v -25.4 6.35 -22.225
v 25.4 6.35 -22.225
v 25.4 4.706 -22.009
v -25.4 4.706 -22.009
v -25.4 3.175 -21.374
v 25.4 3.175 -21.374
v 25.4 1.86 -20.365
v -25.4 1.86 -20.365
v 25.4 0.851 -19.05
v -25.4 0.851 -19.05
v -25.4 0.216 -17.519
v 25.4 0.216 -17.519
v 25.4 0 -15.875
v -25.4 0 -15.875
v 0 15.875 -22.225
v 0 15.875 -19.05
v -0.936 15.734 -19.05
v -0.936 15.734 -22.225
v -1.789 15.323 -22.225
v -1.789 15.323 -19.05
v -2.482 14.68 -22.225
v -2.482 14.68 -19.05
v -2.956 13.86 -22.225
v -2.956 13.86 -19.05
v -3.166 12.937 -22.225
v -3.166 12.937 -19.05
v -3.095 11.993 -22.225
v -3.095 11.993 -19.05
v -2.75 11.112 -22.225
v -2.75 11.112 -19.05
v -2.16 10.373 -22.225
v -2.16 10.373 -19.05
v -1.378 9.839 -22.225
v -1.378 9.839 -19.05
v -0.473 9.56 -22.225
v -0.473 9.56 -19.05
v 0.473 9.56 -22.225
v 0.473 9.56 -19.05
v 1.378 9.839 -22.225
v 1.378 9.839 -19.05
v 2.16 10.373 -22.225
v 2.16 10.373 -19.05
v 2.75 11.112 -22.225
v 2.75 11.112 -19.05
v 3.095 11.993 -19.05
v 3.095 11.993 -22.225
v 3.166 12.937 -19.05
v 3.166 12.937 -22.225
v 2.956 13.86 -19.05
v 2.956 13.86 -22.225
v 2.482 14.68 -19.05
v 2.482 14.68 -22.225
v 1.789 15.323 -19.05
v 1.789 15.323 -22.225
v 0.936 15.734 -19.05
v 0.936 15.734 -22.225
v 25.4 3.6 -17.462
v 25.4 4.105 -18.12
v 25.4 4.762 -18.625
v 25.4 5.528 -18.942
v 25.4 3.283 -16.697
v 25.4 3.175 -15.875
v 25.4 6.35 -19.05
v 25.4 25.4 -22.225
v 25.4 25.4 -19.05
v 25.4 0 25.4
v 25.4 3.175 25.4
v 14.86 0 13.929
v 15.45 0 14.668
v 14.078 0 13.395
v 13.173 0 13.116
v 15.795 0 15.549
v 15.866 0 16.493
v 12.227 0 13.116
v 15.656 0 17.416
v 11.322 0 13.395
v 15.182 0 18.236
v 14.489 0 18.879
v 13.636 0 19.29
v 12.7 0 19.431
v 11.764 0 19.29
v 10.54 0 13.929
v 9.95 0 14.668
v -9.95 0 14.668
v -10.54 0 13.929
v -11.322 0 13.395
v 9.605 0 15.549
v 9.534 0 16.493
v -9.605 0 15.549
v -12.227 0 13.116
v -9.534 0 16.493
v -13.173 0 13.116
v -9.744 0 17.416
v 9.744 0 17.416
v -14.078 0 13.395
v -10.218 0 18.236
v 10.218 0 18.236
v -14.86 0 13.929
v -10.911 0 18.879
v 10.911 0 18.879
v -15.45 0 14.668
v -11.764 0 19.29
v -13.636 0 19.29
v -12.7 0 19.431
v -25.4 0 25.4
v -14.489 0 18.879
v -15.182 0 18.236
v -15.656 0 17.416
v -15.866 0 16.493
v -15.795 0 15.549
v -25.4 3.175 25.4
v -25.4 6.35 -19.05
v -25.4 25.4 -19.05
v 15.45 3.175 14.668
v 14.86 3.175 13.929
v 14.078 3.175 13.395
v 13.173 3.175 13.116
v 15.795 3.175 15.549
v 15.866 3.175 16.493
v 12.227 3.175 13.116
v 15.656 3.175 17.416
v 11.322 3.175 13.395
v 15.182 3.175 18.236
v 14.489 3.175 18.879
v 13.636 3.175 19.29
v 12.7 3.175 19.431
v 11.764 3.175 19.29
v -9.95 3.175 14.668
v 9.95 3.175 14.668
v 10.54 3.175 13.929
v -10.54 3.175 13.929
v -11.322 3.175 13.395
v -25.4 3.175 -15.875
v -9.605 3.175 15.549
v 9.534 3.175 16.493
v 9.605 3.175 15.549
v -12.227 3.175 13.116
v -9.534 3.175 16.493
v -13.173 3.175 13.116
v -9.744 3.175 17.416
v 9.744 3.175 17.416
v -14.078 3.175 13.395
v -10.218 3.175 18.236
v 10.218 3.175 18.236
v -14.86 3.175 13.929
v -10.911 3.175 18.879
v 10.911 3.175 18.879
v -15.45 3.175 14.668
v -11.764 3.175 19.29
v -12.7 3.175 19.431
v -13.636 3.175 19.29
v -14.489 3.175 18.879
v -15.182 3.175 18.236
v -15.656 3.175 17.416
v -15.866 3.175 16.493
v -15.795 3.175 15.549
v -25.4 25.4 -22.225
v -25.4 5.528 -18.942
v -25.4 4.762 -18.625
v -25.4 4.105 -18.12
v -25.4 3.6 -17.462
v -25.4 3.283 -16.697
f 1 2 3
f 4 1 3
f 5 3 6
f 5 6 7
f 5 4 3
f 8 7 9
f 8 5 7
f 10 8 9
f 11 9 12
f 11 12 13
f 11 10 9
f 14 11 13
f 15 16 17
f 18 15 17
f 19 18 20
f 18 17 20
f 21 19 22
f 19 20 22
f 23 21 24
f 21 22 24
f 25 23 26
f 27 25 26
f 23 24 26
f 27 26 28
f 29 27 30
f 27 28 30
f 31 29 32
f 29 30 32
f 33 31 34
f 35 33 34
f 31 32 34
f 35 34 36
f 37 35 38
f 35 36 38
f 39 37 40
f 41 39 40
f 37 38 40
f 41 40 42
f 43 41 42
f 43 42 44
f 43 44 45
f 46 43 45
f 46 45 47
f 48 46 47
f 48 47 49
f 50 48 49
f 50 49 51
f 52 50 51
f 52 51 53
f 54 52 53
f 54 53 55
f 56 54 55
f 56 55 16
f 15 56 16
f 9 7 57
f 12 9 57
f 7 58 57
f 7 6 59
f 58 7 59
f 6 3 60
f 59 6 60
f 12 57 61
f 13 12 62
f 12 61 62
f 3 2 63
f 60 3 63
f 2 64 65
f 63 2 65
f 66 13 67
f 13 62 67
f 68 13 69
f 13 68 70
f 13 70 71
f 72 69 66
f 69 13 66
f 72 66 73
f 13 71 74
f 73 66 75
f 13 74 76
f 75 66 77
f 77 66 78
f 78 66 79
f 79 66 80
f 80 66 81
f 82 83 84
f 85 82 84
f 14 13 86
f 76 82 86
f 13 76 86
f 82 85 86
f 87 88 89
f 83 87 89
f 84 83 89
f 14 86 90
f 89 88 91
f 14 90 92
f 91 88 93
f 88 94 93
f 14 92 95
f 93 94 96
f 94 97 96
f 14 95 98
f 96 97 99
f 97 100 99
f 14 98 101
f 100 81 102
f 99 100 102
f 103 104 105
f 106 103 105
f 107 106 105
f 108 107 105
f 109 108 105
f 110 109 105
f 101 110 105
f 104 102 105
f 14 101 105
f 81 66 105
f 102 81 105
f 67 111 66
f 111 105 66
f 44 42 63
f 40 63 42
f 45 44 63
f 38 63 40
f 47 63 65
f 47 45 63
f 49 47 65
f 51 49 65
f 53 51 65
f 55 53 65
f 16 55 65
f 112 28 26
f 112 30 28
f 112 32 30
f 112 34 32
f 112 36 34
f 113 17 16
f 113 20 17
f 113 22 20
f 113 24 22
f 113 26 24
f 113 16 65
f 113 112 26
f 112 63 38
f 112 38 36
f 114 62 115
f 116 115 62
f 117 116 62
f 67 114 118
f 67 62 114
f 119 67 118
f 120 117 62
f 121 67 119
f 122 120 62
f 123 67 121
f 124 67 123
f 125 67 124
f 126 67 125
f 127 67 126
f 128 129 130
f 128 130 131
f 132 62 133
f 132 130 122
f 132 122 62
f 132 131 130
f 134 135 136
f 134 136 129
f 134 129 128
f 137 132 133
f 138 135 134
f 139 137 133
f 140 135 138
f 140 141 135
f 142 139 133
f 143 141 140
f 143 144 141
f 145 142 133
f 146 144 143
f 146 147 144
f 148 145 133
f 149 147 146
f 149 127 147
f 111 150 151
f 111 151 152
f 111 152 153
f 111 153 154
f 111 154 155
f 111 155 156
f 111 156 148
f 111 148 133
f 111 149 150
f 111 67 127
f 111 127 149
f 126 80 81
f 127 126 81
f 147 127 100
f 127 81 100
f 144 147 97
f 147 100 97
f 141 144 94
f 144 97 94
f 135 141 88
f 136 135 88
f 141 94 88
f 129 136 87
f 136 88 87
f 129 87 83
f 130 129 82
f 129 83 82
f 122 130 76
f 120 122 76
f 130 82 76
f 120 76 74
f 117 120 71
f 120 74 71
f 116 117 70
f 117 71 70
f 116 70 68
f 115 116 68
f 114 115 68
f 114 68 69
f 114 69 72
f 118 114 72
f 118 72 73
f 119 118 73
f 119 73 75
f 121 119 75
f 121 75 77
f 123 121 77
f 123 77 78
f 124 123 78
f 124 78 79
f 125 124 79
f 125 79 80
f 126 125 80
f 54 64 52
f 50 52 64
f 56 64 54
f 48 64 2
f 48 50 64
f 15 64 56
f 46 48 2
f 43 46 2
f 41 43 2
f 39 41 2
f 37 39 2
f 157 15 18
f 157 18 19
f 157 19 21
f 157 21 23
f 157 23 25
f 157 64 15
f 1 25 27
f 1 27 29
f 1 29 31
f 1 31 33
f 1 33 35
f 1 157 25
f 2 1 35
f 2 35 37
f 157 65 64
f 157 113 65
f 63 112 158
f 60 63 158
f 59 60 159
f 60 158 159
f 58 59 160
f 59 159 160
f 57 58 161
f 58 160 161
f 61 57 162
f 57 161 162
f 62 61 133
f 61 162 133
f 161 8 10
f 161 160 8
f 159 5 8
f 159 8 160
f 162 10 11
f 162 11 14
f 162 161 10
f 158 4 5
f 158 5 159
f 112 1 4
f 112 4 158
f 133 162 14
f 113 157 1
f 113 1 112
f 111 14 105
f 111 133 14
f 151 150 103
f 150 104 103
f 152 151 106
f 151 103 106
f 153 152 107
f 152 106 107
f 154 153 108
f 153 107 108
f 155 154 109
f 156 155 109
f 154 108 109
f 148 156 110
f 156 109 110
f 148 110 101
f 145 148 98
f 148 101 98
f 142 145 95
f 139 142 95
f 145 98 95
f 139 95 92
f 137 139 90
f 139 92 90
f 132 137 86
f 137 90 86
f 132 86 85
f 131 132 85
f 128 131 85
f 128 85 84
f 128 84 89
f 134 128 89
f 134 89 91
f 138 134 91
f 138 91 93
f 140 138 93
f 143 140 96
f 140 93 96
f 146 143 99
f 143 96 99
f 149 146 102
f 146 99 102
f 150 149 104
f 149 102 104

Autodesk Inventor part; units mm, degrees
ref_plane "YZ Plane" through (0, 0, 0) normal (1, 0, 0) x (0, 1, 0)
ref_plane "XZ Plane" through (0, 0, 0) normal (0, 1, 0) x (-1, 0, 0)
ref_plane "XY Plane" through (0, 0, 0) normal (0, 0, 1) x (1, 0, 0)
sketch "Sketch1" plane through (0, 0, 0) normal (0, 1, 0) x (-1, 0, 0)
  line L0 (25.4, 25.4) -> (-25.4, 25.4)
  line L1 (-25.4, 25.4) -> (-25.4, -22.225)
  line L2 (-25.4, -22.225) -> (25.4, -22.225)
  line L3 (25.4, -22.225) -> (25.4, 25.4)
  point P0 (0, 0)
  dimension "d0" = 50.8
  dimension "d1" = 47.625
  dimension "d2" = 25.4
  dimension "d3" = 25.4
extrude "Extrusion1" add sketch "Sketch1" along normal blind 3.175
sketch "Sketch4" plane through (-25.4, 0, -19.05) normal (0, 0, -1) x (-1, 0, 0)
  line L0 (-50.8, 0) -> (0, 0)
  line L1 (0, 0) -> (0, 25.4)
  line L2 (0, 25.4) -> (-50.8, 25.4)
  line L3 (-50.8, 25.4) -> (-50.8, 0)
edge flange "Flange1" height 25.4 angle 90 thickness 3.175 bend radius 3.175 thickness toward (0, 0, -1) relief tear relief width 3.175 relief depth 1.5875 edges at (0, 3.175, -22.225) wall of the first edge with corners at (25.4, 0, -19.05) (-25.4, 0, -19.05) (-25.4, 25.4, -19.05) (25.4, 25.4, -19.05)
bend "Bend1"
corner "Corner1"
sketch "Sketch5" plane through (0, 3.175, 0) normal (0, 1, 0) x (1, 0, 0)
  line L0 (-25.4, -25.4) -> (25.4, -25.4) projected
  line L1 (-25.4, 15.875) -> (-25.4, -25.4) projected
  point P0 (0, 0)
  point P1 (-12.7, -16.256)
  point P2 (12.7, -16.256)
  dimension "d23" = 9.144
  dimension "d24" = 9.144
  dimension "d25" = 25.4
  dimension "d26" = 12.7
hole "Hole1" at (-12.7, 3.175, 16.256) at (12.7, 3.175, 16.256) direction (0, -1, 0) diameter 6.35 end through all
sketch "Sketch6" plane through (25.4, 25.4, -22.225) normal (0, 0, -1) x (-1, 0, 0)
  line L0 (0, 0) -> (50.8, 0) projected
  line L1 (50.8, 0) -> (50.8, -19.05) projected
  point P0 (25.4, -25.4)
  point P1 (25.4, -12.7)
  dimension "d34" = 12.7
  dimension "d35" = 25.4
hole "Hole2" at (0, 12.7, -22.225) direction (0, 0, 1) diameter 6.35 end through all
equation "\"d24\" = d23"
equation "\"d32\" = Thickness"
equation "\"d41\" = Thickness"
equation "\"d13\" = BendReliefWidth"
equation "\"d14\" = BendReliefDepth"
equation "\"d15\" = MinimumRemnant"
equation "\"d16\" = BendRadius"
equation "\"d19\" = BendRadius"
equation "\"d20\" = CornerReliefSize"
equation "\"d21\" = GapSize"
equation "\"d22\" = JacobiRadiusSize"
equation "\"BendRadius\" = Thickness"
equation "\"BendReliefWidth\" = Thickness"
equation "\"BendReliefDepth\" = 0.5 * Thickness"
equation "\"CornerReliefSize\" = 4 * Thickness"
equation "\"MinimumRemnant\" = 2 * Thickness"
equation "\"TransitionRadius\" = BendRadius"
equation "\"JacobiRadiusSize\" = BendRadius"
equation "\"GapSize\" = Thickness"
equation "\"Thickness\" = 3.175"
properties part number "Sheet for"
